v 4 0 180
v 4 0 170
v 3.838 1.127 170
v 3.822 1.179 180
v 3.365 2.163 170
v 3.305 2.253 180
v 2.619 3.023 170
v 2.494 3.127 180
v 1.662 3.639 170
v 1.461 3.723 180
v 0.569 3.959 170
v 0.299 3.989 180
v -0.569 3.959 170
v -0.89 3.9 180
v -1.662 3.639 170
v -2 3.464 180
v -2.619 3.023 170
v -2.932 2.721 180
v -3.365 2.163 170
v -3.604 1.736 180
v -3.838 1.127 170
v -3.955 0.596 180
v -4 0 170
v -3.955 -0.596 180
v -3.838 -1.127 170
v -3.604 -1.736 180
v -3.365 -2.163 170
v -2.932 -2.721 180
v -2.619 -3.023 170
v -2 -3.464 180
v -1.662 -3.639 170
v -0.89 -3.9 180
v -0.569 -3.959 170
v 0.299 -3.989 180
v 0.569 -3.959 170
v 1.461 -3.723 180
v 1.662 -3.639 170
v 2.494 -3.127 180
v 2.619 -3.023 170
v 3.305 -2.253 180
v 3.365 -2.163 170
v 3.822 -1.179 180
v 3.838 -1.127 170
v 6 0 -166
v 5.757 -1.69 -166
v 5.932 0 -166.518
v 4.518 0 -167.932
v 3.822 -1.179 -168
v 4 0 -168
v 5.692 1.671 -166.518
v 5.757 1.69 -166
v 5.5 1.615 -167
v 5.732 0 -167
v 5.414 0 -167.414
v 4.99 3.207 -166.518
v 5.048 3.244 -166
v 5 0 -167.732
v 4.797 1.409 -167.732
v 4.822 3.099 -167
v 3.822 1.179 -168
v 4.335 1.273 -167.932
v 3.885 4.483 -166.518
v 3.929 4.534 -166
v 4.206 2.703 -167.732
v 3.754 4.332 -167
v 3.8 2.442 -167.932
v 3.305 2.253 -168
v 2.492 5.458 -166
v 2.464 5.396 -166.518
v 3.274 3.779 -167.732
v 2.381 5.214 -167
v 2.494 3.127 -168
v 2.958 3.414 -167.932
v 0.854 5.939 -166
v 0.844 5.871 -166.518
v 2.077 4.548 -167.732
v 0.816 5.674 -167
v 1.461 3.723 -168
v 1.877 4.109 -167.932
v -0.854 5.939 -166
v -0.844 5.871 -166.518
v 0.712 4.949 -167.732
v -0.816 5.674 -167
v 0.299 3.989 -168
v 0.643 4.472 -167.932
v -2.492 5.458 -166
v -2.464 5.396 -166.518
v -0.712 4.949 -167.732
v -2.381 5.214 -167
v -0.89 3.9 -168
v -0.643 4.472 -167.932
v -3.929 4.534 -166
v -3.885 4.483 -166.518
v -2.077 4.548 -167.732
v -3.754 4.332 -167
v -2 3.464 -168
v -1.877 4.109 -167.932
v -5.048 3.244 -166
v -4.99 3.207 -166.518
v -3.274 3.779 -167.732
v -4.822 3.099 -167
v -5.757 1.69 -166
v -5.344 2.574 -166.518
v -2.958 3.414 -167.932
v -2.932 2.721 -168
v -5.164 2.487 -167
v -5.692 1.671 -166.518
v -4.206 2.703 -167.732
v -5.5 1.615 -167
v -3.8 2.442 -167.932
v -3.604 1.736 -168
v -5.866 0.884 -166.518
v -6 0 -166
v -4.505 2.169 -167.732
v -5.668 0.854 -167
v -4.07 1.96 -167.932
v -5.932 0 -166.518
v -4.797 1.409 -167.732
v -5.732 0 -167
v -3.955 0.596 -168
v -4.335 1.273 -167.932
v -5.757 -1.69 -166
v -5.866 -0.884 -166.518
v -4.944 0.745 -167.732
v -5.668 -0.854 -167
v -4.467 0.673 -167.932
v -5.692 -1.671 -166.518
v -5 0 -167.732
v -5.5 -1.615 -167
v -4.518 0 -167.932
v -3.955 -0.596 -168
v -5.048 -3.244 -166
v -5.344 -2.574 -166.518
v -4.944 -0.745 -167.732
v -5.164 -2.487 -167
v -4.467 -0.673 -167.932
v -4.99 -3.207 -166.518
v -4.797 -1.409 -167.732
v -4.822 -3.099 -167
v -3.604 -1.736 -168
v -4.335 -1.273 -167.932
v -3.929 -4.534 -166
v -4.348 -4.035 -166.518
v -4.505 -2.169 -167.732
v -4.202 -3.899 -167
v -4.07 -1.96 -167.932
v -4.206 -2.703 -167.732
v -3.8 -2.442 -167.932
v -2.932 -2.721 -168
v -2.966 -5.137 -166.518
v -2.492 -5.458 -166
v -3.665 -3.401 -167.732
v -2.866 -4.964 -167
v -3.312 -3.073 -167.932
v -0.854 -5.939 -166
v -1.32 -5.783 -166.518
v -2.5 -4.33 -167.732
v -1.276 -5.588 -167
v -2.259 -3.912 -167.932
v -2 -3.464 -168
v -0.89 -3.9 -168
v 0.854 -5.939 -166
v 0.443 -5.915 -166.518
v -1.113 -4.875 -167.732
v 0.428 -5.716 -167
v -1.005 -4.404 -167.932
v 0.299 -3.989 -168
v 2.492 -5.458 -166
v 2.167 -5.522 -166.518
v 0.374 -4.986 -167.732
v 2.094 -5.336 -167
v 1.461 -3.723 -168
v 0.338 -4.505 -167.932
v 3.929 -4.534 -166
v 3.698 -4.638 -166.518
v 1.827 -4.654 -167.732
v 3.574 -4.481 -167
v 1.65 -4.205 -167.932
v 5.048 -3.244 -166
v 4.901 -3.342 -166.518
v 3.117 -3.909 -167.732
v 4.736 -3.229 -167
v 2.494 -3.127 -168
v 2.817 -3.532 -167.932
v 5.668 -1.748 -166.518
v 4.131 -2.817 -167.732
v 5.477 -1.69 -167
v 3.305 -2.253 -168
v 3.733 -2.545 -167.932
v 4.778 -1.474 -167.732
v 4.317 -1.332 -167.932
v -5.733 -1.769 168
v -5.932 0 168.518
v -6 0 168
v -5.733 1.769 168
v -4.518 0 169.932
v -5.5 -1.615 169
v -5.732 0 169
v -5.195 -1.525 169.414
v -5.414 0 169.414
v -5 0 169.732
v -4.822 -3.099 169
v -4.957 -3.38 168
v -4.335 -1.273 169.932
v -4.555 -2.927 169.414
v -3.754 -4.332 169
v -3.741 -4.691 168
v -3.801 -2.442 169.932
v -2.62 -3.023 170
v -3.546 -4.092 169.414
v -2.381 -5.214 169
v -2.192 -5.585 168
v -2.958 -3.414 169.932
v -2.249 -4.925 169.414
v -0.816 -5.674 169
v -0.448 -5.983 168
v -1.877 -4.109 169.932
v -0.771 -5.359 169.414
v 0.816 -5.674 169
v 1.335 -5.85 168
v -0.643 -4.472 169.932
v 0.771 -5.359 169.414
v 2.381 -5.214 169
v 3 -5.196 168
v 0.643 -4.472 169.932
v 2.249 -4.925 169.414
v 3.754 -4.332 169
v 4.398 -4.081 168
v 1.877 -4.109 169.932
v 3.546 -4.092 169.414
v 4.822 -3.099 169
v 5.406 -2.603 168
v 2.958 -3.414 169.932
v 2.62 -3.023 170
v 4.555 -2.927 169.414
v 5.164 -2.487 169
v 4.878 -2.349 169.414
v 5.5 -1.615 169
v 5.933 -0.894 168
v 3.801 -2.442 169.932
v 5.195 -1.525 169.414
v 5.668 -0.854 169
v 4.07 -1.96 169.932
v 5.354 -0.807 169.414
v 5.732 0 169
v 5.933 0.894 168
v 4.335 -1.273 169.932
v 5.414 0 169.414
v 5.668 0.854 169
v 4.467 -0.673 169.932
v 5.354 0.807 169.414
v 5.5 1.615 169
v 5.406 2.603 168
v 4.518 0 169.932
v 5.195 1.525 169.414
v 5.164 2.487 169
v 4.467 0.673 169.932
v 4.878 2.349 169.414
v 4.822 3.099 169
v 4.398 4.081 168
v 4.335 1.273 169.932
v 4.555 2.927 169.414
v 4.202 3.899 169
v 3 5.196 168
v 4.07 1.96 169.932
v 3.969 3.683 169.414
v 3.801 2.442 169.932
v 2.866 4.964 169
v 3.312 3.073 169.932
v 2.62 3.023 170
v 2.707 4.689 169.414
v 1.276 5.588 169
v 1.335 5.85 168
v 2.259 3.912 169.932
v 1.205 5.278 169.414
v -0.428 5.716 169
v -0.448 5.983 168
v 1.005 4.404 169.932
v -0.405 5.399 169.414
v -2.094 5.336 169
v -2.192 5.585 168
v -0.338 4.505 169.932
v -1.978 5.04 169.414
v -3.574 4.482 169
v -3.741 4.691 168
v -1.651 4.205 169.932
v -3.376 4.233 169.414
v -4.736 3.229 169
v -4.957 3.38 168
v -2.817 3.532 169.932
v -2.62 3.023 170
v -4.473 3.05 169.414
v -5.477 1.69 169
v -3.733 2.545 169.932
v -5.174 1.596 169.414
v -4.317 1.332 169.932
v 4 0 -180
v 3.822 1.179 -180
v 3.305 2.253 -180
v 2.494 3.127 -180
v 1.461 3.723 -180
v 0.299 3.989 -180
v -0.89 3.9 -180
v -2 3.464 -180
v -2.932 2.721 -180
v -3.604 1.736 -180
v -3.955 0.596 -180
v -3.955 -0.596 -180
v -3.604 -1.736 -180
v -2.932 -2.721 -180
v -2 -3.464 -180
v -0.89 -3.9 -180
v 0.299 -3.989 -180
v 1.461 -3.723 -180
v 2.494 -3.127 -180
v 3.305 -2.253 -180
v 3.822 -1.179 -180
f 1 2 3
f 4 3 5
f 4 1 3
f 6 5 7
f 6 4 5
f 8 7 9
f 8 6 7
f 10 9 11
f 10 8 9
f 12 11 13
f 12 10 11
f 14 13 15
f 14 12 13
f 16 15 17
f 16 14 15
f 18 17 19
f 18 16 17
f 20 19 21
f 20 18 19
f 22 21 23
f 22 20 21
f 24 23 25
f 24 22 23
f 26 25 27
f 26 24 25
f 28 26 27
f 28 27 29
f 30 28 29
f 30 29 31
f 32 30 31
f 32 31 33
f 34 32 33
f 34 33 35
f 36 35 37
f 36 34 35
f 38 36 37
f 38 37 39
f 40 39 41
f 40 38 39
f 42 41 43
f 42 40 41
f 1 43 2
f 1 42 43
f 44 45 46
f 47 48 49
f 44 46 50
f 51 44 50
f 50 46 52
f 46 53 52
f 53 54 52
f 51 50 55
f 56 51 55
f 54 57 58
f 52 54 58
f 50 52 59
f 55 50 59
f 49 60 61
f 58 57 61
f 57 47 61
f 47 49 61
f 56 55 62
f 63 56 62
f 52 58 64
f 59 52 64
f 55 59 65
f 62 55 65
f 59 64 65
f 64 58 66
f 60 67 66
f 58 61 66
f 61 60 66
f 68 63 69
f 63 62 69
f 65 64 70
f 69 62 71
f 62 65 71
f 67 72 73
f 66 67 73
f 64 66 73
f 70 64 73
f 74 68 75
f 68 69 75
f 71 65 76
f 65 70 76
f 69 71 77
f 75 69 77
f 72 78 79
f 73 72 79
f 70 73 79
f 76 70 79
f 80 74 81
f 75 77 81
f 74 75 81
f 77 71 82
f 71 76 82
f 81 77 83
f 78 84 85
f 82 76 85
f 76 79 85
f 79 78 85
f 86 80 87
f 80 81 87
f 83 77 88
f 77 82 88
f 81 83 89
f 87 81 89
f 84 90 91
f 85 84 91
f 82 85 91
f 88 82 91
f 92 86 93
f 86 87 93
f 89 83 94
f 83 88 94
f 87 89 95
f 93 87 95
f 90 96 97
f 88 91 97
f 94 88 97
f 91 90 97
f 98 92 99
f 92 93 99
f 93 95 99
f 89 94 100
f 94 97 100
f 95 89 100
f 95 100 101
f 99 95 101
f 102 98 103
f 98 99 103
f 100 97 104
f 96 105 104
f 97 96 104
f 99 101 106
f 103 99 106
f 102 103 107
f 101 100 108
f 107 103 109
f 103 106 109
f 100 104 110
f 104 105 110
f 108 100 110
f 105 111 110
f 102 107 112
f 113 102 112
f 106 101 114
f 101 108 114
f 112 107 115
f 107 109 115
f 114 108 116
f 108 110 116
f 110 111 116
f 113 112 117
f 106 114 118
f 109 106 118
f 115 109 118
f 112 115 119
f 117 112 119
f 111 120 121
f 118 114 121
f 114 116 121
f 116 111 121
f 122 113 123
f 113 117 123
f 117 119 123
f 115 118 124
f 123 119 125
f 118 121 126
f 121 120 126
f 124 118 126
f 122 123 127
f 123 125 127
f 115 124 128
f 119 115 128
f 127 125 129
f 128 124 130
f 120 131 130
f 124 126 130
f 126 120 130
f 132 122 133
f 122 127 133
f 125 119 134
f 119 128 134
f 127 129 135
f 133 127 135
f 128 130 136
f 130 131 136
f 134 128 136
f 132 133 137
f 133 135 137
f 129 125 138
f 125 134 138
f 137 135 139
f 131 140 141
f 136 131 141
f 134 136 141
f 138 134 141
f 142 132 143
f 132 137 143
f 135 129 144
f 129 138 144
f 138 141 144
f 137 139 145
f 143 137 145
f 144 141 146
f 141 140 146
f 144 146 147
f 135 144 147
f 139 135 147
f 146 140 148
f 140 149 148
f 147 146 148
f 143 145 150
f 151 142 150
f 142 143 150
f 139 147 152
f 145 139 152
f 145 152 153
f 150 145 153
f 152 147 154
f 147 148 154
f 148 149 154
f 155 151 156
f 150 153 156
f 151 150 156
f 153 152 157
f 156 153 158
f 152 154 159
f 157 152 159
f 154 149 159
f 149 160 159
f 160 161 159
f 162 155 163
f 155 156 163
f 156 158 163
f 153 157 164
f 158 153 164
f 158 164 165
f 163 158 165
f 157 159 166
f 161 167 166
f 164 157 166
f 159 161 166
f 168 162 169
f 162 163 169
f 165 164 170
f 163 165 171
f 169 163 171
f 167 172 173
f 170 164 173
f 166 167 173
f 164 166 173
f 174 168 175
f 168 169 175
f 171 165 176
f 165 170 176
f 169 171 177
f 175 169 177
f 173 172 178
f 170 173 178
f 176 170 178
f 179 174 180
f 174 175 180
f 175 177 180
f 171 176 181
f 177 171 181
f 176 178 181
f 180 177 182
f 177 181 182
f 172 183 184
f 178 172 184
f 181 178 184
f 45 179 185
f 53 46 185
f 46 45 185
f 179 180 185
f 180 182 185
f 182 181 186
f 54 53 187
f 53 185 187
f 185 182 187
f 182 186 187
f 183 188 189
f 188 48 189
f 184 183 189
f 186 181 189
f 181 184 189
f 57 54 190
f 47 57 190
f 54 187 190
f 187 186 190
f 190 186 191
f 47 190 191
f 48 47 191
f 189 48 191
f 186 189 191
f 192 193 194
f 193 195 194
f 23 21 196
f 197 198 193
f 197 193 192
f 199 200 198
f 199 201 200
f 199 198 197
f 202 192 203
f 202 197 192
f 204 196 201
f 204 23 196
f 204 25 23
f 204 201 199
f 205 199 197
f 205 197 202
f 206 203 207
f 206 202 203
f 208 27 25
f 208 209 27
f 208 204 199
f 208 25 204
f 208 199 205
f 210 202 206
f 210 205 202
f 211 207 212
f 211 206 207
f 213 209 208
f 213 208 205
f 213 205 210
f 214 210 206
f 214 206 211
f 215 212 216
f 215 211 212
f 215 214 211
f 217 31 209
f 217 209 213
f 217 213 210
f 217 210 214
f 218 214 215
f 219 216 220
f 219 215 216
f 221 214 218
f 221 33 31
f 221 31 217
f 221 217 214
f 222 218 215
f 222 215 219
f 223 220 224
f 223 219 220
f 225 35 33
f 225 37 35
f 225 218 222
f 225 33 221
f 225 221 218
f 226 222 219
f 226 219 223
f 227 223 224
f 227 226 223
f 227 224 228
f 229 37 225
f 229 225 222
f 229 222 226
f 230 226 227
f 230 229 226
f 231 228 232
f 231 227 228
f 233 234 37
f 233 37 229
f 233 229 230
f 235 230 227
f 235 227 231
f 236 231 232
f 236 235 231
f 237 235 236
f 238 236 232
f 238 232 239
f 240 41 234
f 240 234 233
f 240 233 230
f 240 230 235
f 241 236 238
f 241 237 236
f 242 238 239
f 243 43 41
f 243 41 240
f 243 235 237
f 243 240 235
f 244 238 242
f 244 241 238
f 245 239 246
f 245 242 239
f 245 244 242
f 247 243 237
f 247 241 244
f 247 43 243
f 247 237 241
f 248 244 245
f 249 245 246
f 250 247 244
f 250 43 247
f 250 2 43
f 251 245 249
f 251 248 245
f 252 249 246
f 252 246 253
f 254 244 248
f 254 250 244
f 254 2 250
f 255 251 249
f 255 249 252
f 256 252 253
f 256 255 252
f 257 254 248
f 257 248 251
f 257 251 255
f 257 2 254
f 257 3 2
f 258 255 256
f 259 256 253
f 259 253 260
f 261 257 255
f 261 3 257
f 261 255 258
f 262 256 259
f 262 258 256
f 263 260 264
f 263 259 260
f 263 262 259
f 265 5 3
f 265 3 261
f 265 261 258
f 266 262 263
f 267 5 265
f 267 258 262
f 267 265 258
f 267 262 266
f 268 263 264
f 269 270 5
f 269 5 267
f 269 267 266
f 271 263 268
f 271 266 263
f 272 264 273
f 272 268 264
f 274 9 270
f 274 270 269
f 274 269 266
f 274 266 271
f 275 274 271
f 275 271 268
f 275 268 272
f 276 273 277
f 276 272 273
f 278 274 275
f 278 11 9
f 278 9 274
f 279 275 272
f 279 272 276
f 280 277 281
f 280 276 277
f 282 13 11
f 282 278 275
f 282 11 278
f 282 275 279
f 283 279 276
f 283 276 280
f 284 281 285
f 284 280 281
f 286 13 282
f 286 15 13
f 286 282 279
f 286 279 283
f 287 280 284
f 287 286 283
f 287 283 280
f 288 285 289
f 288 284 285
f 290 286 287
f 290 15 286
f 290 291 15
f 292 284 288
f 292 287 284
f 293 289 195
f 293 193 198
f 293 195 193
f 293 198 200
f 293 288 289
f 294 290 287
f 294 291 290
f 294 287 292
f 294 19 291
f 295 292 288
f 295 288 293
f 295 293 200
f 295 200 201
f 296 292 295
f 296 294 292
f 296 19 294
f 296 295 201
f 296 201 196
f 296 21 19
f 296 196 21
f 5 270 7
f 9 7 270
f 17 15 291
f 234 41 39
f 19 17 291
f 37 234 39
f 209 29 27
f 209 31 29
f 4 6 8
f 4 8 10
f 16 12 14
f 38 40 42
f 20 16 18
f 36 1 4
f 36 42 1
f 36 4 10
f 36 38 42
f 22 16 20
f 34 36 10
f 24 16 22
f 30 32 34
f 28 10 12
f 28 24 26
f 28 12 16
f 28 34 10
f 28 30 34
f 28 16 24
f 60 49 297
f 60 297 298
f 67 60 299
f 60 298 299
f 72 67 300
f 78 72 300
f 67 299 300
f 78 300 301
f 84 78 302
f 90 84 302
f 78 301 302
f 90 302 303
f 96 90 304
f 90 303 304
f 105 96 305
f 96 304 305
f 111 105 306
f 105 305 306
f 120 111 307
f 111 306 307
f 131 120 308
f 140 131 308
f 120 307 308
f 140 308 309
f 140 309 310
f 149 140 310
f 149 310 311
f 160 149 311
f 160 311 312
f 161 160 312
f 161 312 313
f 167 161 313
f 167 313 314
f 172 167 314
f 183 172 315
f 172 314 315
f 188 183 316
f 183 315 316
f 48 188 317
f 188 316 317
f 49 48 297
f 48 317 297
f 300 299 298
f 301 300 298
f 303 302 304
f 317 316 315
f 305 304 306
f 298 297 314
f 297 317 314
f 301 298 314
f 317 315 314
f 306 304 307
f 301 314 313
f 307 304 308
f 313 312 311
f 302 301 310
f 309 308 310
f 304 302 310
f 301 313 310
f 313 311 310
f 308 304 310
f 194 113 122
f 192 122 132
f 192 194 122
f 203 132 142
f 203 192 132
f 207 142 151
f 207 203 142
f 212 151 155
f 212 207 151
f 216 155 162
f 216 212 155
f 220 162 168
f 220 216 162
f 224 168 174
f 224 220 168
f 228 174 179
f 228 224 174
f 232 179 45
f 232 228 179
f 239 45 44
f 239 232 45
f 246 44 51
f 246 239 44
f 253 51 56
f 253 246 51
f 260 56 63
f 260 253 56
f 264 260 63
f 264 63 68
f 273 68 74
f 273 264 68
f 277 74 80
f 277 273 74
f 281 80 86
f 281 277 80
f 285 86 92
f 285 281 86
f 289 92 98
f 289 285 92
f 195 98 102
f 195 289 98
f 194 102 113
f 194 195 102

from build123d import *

# Parameters (mm, degrees)
SKETCH1_R              = 6
BOSS_EXTRUDE1_DEPTH    = 180
SKETCH2_R              = 6
SKETCH2_R_2            = 4
CUT_EXTRUDE1_DEPTH     = 10
FILLET1_R              = 2
FILLET1_OF_MIRROR1_R   = 2
MOVE_START             = -180.0000001
MOVE_FACE1_2_OUTLINE_W = 16
MOVE_FACE1_2_OUTLINE_H = 16
MOVE_FACE1_2_OUTLINE_R = 4
MOVE_FACE1_2_DEPTH     = 12.0000001


with BuildPart() as part:
    # Sketch1 → Boss-Extrude1 (new, symmetric)
    with BuildSketch(Plane.XY):
        with Locations(Location((0, 0, 0), (0, 0, 180))):
            Circle(SKETCH1_R)
    extrude(amount=BOSS_EXTRUDE1_DEPTH, both=True)

    # Sketch2 → Cut-Extrude1 (cut)
    with BuildSketch(Plane.XY.offset(180)):
        with Locations(Location((0, 0, 0), (0, 0, 180))):
            Circle(SKETCH2_R)
        Circle(SKETCH2_R_2, mode=Mode.SUBTRACT)
    cut_extrude1 = extrude(amount=-CUT_EXTRUDE1_DEPTH, mode=Mode.SUBTRACT)

    # Fillet1
    fillet1_edges = [part.edges().sort_by_distance(p)[0] for p in [
        (6, 0, 170),
    ]]
    fillet(fillet1_edges, radius=FILLET1_R - 0.0001)  # a hair under: the kernel refuses the full size

    # Mirror1: Cut-Extrude1 across plane
    add(cut_extrude1.mirror(Plane.XY), mode=Mode.SUBTRACT)

    # Fillet1 of Mirror1
    fillet1_of_mirror1_edges = [part.edges().sort_by_distance(p)[0] for p in [
        (6, 0, -170),
    ]]
    fillet(fillet1_of_mirror1_edges, radius=FILLET1_OF_MIRROR1_R - 0.0001)  # a hair under: the kernel refuses the full size

    # Move Face1: read off the stored shape, not the designer's step
    # Move Face1 outline → Move Face1 (revolve, cut)
    with BuildSketch(Plane.XZ):
        with BuildLine():
            Line((6, -168), (6, -166))
            ThreePointArc((6, -166), (5.414213562, -167.414213562), (4, -168))
            Line((4, -168), (6, -168))
        make_face()
    revolve(axis=Axis((0, 0, 0), (0, 0, 1)), mode=Mode.SUBTRACT)

    # Move Face1 2 outline → Move Face1 2 (cut)
    with BuildSketch(Plane.XY.offset(MOVE_START)):
        Rectangle(MOVE_FACE1_2_OUTLINE_W, MOVE_FACE1_2_OUTLINE_H)
        Circle(MOVE_FACE1_2_OUTLINE_R, mode=Mode.SUBTRACT)
    extrude(amount=MOVE_FACE1_2_DEPTH, mode=Mode.SUBTRACT)


solid = part.part
